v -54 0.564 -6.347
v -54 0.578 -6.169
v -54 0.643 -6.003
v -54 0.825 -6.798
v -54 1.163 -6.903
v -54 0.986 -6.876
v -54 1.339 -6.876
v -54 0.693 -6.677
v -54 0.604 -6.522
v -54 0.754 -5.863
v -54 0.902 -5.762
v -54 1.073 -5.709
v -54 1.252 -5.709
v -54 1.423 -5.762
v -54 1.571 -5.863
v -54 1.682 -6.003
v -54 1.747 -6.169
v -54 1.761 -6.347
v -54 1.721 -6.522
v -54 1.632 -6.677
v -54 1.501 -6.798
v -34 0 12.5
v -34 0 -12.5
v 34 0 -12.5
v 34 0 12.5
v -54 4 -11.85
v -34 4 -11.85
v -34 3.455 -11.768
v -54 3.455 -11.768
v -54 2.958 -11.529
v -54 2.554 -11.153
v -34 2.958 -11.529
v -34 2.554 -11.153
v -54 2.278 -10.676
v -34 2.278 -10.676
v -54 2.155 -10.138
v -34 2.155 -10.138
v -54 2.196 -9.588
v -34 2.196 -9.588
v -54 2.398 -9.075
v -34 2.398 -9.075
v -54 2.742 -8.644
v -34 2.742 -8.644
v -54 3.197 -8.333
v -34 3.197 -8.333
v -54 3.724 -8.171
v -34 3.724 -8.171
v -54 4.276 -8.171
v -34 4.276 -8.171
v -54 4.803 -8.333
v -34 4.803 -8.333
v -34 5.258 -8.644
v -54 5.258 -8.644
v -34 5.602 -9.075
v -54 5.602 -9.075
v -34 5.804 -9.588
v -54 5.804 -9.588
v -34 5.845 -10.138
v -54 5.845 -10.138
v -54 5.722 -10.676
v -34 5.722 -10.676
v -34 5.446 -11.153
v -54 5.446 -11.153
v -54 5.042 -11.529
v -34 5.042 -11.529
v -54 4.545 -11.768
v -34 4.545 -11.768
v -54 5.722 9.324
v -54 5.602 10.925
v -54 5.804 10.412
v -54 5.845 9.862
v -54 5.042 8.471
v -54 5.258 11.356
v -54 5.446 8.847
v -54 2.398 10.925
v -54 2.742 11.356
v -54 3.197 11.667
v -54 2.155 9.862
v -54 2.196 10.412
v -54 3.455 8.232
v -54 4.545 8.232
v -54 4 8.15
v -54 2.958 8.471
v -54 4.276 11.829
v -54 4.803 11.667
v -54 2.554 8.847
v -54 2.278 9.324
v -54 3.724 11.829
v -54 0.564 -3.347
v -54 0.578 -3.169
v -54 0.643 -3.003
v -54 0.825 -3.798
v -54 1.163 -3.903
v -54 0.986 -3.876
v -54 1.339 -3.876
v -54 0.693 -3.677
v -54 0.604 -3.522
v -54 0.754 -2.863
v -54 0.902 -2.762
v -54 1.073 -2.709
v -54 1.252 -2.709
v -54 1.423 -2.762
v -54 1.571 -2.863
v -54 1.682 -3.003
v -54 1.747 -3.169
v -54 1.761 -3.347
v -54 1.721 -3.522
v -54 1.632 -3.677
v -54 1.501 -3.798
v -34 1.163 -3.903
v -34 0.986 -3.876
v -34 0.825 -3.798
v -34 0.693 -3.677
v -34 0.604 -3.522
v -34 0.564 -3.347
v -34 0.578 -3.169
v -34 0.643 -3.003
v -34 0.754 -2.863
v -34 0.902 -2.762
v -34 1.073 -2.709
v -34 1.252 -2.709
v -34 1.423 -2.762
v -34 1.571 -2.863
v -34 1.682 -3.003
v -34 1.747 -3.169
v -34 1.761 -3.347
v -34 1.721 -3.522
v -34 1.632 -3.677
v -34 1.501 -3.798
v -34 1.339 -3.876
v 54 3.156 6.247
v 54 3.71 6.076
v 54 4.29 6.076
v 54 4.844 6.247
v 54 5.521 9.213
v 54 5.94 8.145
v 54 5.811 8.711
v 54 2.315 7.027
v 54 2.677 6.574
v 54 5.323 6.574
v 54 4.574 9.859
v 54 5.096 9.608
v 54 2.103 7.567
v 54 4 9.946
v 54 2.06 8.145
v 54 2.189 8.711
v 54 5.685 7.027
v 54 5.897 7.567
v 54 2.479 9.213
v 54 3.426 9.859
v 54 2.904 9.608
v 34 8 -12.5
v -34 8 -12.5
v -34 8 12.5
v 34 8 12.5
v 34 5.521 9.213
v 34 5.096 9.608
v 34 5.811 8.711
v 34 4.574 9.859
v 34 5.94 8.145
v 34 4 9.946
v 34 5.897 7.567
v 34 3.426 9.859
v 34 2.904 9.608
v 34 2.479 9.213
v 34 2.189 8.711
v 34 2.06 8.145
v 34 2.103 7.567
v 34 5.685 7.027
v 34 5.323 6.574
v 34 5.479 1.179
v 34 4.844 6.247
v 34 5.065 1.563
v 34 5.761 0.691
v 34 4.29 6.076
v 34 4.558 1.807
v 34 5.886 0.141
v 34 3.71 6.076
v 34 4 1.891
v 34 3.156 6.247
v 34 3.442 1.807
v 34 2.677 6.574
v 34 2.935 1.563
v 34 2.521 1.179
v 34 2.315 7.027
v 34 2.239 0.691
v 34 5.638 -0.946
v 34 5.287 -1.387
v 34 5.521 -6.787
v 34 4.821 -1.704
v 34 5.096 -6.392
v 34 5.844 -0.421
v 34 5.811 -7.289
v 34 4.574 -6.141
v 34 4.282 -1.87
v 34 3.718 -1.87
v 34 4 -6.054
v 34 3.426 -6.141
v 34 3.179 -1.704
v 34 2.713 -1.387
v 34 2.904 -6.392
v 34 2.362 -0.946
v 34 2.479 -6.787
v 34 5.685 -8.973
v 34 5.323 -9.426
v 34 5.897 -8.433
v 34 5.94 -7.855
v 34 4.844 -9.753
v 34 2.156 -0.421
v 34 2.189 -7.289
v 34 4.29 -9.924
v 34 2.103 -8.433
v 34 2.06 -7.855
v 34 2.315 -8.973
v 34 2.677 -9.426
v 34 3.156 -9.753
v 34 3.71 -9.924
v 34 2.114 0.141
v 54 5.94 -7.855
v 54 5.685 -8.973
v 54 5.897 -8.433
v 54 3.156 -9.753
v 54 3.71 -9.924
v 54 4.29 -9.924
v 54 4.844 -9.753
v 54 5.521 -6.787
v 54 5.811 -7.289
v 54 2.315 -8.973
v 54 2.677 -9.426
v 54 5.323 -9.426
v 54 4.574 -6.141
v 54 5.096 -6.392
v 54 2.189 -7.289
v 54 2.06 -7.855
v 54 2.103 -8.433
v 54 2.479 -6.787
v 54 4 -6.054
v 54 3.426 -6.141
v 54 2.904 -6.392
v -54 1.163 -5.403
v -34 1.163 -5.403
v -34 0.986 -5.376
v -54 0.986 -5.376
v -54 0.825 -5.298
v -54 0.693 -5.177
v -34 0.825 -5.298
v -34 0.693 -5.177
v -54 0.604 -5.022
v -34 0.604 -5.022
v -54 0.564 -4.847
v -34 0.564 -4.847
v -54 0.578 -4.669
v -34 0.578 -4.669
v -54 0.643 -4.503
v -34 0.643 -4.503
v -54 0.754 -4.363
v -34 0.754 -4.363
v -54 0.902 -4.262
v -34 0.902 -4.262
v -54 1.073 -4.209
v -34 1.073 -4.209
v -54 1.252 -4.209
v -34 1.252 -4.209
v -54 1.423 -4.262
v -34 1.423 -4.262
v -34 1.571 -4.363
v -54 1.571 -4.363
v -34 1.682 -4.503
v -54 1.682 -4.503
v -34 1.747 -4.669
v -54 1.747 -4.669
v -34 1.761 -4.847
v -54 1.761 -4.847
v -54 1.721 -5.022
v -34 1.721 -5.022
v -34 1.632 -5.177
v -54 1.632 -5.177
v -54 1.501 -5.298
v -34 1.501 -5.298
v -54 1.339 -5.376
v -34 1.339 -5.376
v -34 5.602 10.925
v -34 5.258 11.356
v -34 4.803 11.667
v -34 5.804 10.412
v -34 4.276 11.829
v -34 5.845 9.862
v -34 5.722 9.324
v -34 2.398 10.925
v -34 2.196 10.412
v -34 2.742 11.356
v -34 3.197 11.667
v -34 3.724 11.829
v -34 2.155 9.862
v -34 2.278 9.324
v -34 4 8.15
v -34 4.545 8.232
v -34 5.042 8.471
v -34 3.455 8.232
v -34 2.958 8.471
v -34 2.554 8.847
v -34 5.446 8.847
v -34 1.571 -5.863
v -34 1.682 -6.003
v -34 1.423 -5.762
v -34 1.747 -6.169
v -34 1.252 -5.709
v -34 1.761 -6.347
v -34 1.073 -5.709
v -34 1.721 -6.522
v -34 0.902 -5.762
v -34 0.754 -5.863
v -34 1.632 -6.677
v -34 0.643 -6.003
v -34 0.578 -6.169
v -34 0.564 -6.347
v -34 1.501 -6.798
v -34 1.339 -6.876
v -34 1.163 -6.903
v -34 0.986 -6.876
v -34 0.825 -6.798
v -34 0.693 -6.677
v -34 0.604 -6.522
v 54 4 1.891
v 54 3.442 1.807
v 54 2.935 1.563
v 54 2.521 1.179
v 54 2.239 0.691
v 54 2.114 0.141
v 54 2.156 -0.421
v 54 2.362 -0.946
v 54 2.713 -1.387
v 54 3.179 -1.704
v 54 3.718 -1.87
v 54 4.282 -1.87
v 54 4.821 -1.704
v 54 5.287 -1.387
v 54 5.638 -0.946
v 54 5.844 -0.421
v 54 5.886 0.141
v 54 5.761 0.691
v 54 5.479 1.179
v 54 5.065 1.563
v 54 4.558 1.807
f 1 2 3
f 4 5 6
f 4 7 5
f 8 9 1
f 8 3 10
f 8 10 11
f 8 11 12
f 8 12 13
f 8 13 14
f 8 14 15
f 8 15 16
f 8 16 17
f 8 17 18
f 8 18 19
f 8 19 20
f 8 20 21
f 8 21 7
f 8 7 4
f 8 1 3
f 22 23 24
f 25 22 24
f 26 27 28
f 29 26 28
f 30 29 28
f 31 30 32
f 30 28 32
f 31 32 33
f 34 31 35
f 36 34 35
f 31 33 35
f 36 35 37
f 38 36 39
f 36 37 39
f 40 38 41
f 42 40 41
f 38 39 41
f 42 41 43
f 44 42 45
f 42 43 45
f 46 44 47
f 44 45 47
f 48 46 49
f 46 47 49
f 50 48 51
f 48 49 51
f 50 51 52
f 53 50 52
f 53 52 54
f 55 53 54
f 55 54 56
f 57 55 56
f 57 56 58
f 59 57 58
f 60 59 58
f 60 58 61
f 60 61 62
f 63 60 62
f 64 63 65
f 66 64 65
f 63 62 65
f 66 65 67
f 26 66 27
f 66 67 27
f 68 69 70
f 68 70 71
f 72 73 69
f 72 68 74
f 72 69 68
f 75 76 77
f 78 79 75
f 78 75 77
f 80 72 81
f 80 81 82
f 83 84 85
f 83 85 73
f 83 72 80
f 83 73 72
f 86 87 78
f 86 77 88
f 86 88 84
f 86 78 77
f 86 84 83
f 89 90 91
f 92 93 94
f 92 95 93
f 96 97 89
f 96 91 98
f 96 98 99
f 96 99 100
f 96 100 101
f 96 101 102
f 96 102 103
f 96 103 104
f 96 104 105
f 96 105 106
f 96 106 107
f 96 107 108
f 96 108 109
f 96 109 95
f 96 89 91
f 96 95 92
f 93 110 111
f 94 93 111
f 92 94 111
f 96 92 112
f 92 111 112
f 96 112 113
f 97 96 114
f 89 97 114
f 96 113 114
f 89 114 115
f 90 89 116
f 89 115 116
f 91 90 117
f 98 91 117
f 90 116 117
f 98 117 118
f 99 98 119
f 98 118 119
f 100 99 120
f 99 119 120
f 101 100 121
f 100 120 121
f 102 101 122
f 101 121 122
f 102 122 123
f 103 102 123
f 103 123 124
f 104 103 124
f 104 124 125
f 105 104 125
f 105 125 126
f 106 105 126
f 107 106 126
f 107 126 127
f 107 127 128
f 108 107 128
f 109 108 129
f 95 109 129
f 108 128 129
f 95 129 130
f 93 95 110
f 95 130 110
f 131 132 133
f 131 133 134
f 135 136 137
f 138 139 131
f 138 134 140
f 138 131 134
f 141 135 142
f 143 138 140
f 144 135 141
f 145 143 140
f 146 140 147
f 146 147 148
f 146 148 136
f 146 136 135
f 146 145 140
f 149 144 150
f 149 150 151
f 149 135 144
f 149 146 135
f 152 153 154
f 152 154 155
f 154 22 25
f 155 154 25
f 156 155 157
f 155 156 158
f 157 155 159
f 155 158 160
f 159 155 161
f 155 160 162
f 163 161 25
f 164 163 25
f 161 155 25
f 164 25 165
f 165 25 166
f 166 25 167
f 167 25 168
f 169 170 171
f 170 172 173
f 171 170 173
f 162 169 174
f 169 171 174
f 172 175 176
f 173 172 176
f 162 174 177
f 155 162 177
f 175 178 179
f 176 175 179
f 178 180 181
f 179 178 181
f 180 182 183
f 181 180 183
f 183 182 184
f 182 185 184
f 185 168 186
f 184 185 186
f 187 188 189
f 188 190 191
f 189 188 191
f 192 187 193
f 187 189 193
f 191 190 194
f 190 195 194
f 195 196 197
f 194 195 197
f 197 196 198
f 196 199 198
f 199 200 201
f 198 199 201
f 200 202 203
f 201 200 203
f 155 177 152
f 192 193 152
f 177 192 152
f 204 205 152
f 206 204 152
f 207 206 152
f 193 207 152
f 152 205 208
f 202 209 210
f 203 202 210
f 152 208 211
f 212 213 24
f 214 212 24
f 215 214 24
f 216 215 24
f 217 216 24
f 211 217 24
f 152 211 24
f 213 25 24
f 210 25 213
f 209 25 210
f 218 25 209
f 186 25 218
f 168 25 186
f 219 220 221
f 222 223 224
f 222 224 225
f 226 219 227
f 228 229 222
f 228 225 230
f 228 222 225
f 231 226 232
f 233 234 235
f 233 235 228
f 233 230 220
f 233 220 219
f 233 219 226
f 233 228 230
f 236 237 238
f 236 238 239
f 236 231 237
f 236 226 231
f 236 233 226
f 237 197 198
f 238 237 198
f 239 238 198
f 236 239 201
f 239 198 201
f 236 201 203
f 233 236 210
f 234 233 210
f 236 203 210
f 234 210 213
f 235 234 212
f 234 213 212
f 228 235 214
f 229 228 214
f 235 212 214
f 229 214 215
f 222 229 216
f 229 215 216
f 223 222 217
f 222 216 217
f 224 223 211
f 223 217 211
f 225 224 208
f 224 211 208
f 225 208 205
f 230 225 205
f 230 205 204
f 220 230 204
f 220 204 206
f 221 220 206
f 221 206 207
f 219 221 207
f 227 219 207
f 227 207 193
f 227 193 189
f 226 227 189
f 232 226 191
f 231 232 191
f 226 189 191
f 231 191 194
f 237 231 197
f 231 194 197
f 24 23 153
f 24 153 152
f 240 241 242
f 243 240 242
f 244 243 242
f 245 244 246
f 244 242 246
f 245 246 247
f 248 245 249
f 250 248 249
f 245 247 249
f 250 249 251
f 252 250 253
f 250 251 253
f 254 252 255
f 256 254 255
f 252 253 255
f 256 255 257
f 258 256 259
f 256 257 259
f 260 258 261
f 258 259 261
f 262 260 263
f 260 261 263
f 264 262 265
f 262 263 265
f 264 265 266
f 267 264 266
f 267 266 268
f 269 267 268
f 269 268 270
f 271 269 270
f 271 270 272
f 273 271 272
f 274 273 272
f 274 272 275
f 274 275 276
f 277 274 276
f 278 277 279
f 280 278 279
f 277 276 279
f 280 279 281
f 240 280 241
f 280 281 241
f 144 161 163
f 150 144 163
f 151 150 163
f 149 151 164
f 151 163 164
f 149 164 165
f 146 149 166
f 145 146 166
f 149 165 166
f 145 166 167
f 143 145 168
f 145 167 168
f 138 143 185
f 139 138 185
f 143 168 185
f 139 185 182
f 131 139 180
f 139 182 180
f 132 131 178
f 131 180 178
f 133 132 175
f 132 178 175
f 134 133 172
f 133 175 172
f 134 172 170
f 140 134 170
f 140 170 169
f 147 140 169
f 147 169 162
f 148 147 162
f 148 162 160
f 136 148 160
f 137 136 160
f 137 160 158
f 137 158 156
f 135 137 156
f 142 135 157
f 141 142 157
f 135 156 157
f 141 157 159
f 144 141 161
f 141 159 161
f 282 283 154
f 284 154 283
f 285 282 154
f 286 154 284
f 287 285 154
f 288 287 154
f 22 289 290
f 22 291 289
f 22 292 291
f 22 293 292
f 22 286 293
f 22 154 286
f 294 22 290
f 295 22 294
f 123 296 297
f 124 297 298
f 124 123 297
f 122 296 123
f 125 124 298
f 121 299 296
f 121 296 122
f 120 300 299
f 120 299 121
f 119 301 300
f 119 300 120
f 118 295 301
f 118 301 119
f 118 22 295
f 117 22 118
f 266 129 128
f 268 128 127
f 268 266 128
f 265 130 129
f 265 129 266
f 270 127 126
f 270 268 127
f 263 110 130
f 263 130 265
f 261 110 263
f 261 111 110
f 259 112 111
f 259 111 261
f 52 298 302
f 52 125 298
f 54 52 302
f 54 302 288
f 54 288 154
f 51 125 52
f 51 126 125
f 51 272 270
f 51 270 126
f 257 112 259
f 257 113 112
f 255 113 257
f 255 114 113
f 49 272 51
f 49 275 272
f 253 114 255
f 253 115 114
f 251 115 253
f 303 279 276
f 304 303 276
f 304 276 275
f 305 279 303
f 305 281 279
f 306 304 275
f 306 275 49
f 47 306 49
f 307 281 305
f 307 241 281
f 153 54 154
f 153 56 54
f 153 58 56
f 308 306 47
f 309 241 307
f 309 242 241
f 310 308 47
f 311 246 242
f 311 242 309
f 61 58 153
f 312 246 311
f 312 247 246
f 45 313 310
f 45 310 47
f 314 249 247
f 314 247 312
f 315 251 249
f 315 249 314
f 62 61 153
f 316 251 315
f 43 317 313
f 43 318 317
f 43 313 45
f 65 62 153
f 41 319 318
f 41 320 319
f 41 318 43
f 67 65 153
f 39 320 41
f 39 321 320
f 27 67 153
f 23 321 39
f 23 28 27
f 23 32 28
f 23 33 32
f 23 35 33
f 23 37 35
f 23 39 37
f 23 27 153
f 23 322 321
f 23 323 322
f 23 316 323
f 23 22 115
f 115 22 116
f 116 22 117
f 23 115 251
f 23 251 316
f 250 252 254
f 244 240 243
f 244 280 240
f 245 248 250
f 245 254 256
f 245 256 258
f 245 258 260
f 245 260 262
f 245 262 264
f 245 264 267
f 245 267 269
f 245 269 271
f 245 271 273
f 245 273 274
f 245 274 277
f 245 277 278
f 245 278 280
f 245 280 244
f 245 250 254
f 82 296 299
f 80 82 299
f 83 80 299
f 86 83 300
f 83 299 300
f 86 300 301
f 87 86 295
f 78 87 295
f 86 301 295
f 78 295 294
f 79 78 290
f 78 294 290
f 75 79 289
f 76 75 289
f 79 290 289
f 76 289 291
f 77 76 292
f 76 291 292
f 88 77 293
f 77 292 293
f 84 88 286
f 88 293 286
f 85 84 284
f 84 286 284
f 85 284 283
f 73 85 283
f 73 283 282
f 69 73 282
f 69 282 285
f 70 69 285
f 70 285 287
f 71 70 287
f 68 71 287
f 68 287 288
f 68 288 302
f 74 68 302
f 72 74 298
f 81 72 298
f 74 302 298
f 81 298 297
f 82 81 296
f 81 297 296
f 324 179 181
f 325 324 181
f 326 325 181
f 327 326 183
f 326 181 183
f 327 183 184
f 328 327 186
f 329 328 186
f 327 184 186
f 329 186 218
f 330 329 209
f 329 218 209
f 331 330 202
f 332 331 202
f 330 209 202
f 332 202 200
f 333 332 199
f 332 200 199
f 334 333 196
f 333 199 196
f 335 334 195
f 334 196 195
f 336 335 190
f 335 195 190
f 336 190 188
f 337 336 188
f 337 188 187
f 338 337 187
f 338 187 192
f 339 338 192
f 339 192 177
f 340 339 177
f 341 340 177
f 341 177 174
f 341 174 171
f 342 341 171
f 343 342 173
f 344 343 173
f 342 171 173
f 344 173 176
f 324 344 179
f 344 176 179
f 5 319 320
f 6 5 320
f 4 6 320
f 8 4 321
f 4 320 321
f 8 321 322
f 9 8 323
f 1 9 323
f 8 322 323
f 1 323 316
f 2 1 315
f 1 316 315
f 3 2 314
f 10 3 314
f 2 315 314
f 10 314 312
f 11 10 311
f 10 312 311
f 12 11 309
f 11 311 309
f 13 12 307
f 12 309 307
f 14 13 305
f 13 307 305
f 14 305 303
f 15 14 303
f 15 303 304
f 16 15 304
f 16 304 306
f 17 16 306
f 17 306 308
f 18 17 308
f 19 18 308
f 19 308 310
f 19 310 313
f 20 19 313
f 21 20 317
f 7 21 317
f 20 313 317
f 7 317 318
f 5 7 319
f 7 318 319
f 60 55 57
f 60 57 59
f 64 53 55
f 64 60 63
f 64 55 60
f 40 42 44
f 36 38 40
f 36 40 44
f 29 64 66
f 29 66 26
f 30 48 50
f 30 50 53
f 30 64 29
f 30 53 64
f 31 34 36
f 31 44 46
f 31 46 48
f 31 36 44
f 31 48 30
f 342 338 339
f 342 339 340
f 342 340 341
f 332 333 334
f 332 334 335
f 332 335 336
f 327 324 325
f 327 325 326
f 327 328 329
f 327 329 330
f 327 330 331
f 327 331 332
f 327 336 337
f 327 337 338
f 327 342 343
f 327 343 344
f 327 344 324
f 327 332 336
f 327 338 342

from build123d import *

# Parameters (mm, degrees)
ESQUISSE1_W        = 68
ESQUISSE1_H        = 25
BOSS_EXTRU_1_DEPTH = 8
ESQUISSE2_R        = 1.85
ESQUISSE2_R_2      = 0.6
BOSS_EXTRU_2_DEPTH = 20
ESQUISSE3_R        = 1.945702626
ESQUISSE3_R_2      = 1.891437126
BOSS_EXTRU_3_DEPTH = 20


with BuildPart() as part:
    # Esquisse1 → Boss.-Extru.1 (new body)
    with BuildSketch(Plane(origin=(0, 0, 0), x_dir=(1, 0, 0), z_dir=(0, 1, 0))):
        Rectangle(ESQUISSE1_W, ESQUISSE1_H)
    extrude(amount=BOSS_EXTRU_1_DEPTH)

    # Esquisse2 → Boss.-Extru.2 (add)
    with BuildSketch(Plane.ZY.offset(34)):
        with Locations(Location((-10, 4, 0), (0, 0, 180))):
            Circle(ESQUISSE2_R)
        with Locations(Location((10, 4, 0), (0, 0, 180))):
            Circle(ESQUISSE2_R)
        with Locations(Location((-6.30252834, 1.162523301, 0), (0, 0, 180))):
            Circle(ESQUISSE2_R_2)
        with Locations(Location((-4.80252834, 1.162523301, 0), (0, 0, 180))):
            Circle(ESQUISSE2_R_2)
        with Locations(Location((-3.30252834, 1.162523301, 0), (0, 0, 180))):
            Circle(ESQUISSE2_R_2)
    extrude(amount=BOSS_EXTRU_2_DEPTH)

    # Esquisse3 → Boss.-Extru.3 (add)
    with BuildSketch(Plane(origin=(34, 0, 0), x_dir=(0, 0, -1), z_dir=(1, 0, 0))):
        with Locations(Location((-8, 4, 0), (0, 0, 180))):
            Circle(ESQUISSE3_R)
        with Locations(Location((0, 4, 0), (0, 0, 180))):
            Circle(ESQUISSE3_R_2)
        with Locations(Location((8, 4, 0), (0, 0, 180))):
            Circle(ESQUISSE3_R)
    extrude(amount=BOSS_EXTRU_3_DEPTH)


solid = part.part
